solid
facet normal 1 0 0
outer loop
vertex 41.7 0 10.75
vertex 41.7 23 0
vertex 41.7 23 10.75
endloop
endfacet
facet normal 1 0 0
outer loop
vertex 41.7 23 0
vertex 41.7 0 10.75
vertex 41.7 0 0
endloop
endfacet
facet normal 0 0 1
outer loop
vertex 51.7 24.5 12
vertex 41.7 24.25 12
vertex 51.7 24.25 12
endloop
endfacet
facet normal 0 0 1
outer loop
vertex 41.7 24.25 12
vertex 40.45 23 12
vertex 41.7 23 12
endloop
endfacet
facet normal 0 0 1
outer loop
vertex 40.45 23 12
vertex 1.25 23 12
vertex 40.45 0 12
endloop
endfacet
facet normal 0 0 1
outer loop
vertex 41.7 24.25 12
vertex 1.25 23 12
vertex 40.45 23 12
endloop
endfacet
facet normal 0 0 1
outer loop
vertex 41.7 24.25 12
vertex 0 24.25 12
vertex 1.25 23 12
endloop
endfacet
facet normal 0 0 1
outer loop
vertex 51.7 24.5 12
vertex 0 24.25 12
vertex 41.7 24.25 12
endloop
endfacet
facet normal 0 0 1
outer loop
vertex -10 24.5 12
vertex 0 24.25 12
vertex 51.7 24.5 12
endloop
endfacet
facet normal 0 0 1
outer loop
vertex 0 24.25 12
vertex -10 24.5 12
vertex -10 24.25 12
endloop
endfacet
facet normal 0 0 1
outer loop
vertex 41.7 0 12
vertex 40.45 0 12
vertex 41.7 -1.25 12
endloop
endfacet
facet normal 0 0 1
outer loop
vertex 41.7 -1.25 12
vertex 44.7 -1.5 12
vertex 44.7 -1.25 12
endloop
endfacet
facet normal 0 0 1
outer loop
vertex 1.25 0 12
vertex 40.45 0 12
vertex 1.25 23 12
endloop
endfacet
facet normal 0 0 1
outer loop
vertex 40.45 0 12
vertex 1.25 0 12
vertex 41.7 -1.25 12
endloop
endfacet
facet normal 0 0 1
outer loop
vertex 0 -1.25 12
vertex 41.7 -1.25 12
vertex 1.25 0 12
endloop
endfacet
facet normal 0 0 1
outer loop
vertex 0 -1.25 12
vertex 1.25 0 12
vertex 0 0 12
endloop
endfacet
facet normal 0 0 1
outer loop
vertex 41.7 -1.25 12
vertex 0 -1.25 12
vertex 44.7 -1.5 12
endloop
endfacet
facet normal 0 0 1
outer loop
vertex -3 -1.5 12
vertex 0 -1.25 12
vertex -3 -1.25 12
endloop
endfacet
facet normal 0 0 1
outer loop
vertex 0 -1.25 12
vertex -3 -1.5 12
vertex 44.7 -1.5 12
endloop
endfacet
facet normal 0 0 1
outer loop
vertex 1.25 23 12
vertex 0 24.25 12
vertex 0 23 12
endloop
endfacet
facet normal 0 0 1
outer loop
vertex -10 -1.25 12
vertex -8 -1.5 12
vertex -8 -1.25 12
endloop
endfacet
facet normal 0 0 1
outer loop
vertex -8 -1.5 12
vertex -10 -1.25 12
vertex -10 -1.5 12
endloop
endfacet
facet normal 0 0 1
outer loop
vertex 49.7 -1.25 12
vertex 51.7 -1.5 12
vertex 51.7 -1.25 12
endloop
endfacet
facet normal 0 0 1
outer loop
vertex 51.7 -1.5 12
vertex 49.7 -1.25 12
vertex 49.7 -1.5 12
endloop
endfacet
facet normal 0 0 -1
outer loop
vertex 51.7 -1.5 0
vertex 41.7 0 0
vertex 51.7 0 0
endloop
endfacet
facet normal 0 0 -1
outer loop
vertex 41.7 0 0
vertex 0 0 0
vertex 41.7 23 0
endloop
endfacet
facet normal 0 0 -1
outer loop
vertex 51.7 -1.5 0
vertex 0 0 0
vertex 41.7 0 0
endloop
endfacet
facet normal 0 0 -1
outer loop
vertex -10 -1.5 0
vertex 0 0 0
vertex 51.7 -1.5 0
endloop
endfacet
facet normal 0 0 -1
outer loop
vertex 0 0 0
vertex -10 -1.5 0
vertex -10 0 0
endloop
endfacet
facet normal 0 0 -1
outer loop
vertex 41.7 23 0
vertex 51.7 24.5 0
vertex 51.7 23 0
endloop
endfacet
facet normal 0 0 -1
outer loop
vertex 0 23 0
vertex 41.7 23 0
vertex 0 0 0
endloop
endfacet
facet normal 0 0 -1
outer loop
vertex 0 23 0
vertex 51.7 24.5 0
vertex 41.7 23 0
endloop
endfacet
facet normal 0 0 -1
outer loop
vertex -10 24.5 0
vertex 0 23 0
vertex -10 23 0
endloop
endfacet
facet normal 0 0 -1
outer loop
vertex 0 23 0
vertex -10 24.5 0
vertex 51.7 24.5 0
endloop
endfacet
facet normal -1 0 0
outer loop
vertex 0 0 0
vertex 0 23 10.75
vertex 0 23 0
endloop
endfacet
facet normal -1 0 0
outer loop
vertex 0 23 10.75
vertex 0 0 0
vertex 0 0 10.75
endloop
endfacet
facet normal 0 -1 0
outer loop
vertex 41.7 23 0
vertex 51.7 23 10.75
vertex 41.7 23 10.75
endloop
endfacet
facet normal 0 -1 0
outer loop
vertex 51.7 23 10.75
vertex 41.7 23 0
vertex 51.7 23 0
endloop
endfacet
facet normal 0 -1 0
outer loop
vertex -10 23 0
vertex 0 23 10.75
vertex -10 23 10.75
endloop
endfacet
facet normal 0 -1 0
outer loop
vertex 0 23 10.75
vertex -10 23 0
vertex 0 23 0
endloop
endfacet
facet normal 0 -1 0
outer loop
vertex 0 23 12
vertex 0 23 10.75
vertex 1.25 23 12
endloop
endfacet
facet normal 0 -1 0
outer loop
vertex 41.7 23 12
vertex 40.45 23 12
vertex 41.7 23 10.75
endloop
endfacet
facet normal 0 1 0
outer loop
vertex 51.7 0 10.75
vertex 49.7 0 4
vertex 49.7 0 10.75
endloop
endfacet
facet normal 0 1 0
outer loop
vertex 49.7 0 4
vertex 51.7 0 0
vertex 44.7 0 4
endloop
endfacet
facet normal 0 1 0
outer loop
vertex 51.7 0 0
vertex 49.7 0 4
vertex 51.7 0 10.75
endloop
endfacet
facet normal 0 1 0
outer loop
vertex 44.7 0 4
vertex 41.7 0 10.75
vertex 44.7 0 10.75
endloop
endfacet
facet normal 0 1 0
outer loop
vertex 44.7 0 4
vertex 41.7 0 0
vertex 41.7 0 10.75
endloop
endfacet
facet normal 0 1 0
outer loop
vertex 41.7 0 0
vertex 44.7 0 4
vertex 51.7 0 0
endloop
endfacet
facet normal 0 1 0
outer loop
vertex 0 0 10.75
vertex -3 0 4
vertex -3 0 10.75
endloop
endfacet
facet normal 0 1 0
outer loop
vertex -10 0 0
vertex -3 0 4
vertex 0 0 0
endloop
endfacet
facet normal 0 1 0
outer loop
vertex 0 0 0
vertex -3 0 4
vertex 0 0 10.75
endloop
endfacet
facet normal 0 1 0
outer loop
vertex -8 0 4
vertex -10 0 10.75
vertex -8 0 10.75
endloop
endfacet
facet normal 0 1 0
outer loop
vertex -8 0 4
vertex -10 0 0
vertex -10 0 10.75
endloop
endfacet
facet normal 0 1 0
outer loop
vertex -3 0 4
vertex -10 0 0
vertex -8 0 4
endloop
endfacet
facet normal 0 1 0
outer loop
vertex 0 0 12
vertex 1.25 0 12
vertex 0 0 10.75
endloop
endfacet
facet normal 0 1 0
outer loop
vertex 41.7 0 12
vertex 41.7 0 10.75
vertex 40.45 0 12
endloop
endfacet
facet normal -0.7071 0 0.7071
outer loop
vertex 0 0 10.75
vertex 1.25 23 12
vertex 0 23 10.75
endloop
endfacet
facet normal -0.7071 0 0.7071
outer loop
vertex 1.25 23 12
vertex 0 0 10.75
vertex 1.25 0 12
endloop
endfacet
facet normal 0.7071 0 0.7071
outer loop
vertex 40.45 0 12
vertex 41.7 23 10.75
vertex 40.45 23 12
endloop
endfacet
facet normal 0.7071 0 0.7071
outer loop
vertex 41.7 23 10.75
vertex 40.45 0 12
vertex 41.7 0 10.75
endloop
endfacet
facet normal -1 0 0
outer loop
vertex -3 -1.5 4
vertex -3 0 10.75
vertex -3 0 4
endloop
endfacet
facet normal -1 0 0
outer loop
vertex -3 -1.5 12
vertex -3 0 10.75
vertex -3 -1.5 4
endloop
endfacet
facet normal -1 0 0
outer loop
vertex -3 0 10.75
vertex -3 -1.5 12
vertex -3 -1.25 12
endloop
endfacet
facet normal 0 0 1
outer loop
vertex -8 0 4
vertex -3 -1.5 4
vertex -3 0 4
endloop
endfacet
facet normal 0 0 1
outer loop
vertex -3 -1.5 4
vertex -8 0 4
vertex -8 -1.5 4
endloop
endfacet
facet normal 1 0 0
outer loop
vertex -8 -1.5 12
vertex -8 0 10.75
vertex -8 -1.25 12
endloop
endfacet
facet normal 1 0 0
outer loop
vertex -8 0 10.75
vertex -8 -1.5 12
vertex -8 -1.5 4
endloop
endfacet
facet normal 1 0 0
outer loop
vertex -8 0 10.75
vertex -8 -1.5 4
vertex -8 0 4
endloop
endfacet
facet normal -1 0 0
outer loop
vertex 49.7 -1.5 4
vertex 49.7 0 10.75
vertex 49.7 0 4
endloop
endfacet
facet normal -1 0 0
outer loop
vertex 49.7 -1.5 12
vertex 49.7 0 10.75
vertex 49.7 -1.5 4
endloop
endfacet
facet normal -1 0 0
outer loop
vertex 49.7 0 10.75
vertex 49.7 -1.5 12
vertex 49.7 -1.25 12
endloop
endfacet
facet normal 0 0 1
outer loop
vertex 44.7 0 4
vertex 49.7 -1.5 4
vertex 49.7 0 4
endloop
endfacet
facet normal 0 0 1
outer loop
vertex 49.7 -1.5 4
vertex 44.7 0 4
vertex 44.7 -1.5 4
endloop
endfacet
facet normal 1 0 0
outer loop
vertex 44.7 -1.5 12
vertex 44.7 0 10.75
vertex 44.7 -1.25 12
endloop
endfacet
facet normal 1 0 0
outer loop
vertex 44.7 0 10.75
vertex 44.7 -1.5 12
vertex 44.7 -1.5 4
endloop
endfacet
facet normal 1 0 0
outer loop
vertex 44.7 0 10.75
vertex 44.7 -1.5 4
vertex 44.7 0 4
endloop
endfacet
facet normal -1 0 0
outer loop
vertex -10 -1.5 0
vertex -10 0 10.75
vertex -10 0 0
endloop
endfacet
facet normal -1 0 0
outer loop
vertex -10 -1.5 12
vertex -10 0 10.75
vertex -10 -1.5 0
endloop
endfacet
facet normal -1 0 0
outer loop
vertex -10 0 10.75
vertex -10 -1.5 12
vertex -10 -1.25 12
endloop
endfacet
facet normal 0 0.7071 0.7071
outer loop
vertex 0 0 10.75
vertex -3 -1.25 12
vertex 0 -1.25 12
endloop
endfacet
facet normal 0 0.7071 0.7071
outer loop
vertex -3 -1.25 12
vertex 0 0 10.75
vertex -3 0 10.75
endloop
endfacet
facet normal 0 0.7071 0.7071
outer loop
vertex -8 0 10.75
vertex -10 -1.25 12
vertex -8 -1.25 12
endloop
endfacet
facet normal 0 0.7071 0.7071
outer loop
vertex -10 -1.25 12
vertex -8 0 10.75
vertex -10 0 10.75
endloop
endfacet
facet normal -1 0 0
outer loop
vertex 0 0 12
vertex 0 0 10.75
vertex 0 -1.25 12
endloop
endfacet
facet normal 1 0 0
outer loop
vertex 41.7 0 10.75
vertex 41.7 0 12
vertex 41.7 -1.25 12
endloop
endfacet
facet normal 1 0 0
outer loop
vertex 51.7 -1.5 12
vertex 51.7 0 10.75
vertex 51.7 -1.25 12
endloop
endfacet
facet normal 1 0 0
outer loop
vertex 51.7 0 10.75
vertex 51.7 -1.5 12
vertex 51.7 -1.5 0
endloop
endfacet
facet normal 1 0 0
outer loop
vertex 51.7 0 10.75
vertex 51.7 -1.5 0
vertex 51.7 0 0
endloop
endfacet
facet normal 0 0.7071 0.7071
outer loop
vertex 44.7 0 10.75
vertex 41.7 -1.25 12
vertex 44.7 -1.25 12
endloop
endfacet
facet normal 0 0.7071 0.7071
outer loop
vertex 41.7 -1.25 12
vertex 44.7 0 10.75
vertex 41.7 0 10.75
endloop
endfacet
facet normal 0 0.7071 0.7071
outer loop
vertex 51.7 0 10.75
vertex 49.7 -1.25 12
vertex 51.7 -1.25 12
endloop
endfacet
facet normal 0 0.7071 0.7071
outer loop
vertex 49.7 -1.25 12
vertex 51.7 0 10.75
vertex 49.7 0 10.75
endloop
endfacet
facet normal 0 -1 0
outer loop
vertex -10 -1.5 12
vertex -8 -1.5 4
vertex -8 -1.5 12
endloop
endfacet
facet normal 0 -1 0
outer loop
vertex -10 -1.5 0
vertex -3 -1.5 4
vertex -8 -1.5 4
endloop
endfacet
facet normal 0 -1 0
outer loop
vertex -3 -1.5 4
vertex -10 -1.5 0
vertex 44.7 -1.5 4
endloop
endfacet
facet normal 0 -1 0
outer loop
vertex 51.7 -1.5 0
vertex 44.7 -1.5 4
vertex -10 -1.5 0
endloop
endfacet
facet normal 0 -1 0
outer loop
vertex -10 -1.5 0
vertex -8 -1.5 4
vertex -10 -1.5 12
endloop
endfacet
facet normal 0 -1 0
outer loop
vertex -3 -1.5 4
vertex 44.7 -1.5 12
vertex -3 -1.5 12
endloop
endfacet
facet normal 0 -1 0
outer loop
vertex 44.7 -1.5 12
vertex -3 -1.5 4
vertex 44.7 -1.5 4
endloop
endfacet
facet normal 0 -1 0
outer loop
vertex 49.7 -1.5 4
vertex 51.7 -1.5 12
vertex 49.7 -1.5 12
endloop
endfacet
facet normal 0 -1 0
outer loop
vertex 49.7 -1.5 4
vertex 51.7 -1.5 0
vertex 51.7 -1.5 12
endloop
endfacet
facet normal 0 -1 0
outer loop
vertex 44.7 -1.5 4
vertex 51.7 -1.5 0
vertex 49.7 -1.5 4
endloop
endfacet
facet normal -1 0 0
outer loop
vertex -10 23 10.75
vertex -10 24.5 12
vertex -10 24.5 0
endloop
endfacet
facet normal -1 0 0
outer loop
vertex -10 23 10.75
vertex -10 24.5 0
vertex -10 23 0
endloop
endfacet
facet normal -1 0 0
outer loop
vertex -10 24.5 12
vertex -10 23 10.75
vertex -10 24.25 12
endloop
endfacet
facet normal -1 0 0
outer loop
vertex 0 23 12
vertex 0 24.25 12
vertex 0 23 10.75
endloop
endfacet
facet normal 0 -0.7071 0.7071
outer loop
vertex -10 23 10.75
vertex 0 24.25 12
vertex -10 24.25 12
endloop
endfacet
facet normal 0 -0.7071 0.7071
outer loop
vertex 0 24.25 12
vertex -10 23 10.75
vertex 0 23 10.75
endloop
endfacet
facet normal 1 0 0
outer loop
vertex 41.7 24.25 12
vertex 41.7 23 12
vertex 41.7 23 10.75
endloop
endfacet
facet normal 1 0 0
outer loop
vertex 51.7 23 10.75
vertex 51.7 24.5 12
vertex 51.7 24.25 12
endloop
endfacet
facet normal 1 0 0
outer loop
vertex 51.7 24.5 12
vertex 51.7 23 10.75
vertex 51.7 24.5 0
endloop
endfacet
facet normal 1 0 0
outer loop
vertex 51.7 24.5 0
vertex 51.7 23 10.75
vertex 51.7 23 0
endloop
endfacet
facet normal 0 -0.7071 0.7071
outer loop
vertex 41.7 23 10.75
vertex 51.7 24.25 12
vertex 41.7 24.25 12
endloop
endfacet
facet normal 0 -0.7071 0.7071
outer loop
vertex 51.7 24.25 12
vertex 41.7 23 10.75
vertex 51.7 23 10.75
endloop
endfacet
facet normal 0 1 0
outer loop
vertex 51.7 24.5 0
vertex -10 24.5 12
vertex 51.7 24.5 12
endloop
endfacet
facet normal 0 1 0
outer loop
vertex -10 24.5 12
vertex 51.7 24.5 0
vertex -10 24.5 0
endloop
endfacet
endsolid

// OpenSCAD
// Motor Tension Block
// Key dimensions
length        = 41.7;  // mm, main block long axis
width         = 23.0;  // mm, main block width
height        = 12.0;  // mm
fin_thickness = 1.5;   // mm, fin wall thickness (Y direction)
fin_extension = 10.0;  // mm, how far fins extend beyond each end of the block (X direction)

// Wire notch — two notches on one fin, one at each end, open at the top
notch_inset  = 2.0;   // mm, distance from fin tip to near edge of notch
notch_length = 5.0;   // mm, notch extent along the fin (X direction)
notch_depth  = 8.0;   // mm, notch depth from top of fin (Z direction)

// Bevel — 45° chamfers to guide the part down over the motor:
//   • inner top edges of the fin extensions (not alongside the block)
//   • top edges of the two exposed block ends
bevel_size = 1.25;    // mm, leg length of chamfer triangle

// Derived
fin_total_length = length + 2 * fin_extension;  // 61.7mm
notch_x_near     = -fin_extension + notch_inset;
notch_x_far      = length + fin_extension - notch_inset - notch_length;
bevel            = bevel_size * sqrt(2);

module wire_notches(y_start) {
    translate([notch_x_near, y_start - 1, height - notch_depth])
        cube([notch_length, fin_thickness + 2, notch_depth + 1]);
    translate([notch_x_far,  y_start - 1, height - notch_depth])
        cube([notch_length, fin_thickness + 2, notch_depth + 1]);
}

// 45° chamfer on the inner top edge of a fin at Y=y_inner, restricted to the
// two extension sections only (not the run alongside the block body).
module fin_inner_bevel(y_inner) {
    // Near extension: X = -fin_extension to 0
    translate([-fin_extension, y_inner, height])
        rotate([45, 0, 0])
        translate([0, -bevel/2, -bevel/2])
        cube([fin_extension, bevel, bevel]);
    // Far extension: X = length to length+fin_extension
    translate([length, y_inner, height])
        rotate([45, 0, 0])
        translate([0, -bevel/2, -bevel/2])
        cube([fin_extension, bevel, bevel]);
}

// 45° chamfer on the top edge of a block end face (edge runs along Y at X=x_pos, Z=height).
module block_end_bevel(x_pos) {
    translate([x_pos, 0, height])
        rotate([0, -45, 0])
        translate([-bevel/2, 0, -bevel/2])
        cube([bevel, width, bevel]);
}

// Main block — bevel the two exposed end top edges
difference() {
    cube([length, width, height]);
    block_end_bevel(0);       // near end (X=0)
    block_end_bevel(length);  // far end (X=length)
}

// Notched fin — bevel on inner top edge of extension sections only
difference() {
    translate([-fin_extension, -fin_thickness, 0])
        cube([fin_total_length, fin_thickness, height]);
    wire_notches(-fin_thickness);
    fin_inner_bevel(0);
}

// Plain fin — bevel on inner top edge of extension sections only
difference() {
    translate([-fin_extension, width, 0])
        cube([fin_total_length, fin_thickness, height]);
    fin_inner_bevel(width);
}
